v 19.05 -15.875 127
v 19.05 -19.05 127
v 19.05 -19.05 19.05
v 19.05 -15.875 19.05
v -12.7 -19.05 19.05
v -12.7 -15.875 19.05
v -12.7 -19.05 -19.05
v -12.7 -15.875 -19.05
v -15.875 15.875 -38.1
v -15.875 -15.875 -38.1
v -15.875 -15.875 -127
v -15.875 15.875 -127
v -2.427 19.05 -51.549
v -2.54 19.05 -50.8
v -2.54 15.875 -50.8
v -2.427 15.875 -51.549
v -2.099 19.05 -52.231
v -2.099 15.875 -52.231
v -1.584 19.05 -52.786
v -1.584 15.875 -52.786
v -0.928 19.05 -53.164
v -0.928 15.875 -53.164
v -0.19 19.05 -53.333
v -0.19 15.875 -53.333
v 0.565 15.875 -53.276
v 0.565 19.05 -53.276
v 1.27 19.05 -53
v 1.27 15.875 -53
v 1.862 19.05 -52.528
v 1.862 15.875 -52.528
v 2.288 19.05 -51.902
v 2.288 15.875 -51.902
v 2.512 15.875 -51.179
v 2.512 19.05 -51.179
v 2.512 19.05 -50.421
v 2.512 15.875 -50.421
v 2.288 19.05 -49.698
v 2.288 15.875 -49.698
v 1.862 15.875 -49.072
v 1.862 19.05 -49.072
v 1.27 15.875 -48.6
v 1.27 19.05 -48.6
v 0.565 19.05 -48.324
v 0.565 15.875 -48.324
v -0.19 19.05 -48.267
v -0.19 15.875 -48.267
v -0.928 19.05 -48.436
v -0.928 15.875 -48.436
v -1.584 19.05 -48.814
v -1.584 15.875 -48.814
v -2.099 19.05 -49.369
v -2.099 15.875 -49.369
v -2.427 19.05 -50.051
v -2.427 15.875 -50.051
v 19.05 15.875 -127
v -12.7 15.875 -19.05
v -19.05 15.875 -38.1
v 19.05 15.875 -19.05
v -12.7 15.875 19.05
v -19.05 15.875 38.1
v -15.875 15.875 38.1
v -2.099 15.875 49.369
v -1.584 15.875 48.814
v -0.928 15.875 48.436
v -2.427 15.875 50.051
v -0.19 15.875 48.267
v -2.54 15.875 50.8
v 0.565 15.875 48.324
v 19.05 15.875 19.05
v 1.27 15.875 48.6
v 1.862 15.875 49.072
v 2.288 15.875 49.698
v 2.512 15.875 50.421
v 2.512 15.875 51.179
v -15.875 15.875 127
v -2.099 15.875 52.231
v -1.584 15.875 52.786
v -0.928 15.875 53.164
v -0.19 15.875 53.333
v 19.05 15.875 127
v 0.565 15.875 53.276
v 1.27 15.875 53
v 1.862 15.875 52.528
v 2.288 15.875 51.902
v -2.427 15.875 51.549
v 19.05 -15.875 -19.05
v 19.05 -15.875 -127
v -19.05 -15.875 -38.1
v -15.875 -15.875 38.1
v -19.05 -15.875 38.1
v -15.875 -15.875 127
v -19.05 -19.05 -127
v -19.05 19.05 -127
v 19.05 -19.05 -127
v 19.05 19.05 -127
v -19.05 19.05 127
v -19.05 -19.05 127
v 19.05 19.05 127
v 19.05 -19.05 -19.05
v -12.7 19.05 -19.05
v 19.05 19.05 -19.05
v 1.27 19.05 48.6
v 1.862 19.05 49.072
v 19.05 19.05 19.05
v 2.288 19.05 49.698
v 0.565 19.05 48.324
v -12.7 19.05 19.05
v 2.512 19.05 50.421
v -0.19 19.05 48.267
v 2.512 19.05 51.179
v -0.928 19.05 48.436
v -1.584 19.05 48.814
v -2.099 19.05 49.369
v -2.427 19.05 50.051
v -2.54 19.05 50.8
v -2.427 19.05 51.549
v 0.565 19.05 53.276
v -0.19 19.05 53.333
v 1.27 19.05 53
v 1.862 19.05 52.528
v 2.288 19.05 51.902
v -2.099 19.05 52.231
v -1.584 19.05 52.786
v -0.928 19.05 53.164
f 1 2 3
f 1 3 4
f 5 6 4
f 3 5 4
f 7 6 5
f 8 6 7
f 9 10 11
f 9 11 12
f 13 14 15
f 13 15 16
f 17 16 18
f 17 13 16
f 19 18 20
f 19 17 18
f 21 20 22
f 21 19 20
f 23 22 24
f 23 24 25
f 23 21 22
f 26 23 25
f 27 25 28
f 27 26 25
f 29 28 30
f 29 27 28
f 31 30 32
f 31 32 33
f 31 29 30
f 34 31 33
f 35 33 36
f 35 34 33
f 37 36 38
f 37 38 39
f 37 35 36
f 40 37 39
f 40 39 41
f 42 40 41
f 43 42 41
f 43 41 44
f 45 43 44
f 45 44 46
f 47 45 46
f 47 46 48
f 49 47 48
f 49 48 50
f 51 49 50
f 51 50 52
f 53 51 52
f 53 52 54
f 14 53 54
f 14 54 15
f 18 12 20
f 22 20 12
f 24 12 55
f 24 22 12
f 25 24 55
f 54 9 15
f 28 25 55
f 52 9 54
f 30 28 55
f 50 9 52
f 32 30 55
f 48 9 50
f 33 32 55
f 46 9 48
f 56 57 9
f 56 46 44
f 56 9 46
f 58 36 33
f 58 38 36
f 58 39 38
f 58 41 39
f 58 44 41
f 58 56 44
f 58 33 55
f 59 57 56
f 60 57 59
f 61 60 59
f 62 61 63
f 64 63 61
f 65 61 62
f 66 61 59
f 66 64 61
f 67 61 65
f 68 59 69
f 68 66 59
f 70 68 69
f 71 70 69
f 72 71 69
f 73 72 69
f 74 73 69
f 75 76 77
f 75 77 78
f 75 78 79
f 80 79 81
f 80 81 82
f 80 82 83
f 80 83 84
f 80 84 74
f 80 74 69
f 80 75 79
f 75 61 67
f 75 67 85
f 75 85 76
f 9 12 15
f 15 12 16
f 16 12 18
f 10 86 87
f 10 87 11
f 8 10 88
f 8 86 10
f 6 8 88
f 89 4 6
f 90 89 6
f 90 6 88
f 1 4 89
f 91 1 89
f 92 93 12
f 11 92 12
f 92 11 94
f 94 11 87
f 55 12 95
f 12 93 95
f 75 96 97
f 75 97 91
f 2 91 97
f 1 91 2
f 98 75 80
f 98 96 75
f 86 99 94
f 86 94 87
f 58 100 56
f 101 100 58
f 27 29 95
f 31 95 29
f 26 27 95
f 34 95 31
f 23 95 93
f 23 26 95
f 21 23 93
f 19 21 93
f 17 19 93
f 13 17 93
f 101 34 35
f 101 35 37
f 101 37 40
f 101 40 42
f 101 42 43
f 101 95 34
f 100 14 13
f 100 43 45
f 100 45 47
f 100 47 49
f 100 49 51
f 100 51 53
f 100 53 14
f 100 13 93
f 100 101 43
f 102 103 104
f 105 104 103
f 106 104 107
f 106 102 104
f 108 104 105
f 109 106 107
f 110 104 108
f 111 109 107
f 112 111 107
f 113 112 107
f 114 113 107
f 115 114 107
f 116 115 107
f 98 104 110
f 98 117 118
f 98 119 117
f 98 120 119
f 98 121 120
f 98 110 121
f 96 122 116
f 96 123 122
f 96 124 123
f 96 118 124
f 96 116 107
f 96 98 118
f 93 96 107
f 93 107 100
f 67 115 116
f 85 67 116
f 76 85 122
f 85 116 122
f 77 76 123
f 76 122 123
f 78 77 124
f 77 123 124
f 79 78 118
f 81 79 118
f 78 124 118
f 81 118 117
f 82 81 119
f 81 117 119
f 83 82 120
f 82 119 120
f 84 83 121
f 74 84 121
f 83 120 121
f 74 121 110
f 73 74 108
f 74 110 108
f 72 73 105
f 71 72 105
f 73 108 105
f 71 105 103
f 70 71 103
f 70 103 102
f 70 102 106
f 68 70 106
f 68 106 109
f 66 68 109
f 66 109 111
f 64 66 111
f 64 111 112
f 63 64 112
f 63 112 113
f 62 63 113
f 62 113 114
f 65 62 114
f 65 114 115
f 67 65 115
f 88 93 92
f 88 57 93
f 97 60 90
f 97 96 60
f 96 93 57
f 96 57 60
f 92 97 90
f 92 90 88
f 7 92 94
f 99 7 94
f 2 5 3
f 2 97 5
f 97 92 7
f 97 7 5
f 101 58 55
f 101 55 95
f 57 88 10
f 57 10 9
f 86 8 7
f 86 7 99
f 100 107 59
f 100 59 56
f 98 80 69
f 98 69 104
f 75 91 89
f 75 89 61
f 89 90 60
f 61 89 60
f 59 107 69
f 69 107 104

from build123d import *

# Parameters (mm, degrees)
BOSS_EXTRUDE1_DEPTH = 127
SKETCH2_W           = 31.75
SKETCH2_H           = 38.1
CUT_EXTRUDE1_DEPTH  = 134.953396747
SKETCH3_W           = 76.2
SKETCH3_H           = 31.75
CUT_EXTRUDE2_DEPTH  = 134.953396747
CUT_EXTRUDE3_REACH  = 135.953
SKETCH4_R           = 2.54


with BuildPart() as part:
    # Sketch1 → Boss-Extrude1 (new, symmetric)
    with BuildSketch(Plane.XY):
        Polygon((19.05, 19.05), (-19.05, 19.05), (-19.05, -19.05), (19.05, -19.05), (19.05, -15.875), (-15.875, -15.875), (-15.875, 15.875), (19.05, 15.875), align=None)
    extrude(amount=BOSS_EXTRUDE1_DEPTH, both=True)

    # Sketch2 → Cut-Extrude1 (cut, through all)
    with BuildSketch(Plane(origin=(0, 19.05, 0), x_dir=(1, 0, 0), z_dir=(0, 1, 0))):
        with Locations((3.175, 0)):
            Rectangle(SKETCH2_W, SKETCH2_H)
    extrude(amount=-CUT_EXTRUDE1_DEPTH, mode=Mode.SUBTRACT)

    # Sketch3 → Cut-Extrude2 (cut, through all)
    with BuildSketch(Plane.ZY.offset(19.05)):
        Rectangle(SKETCH3_W, SKETCH3_H)
    extrude(amount=-CUT_EXTRUDE2_DEPTH, mode=Mode.SUBTRACT)

    # Sketch4 → Cut-Extrude3 (cut, up to next)
    with BuildSketch(Plane(origin=(0, 19.05, 0), x_dir=(1, 0, 0), z_dir=(0, 1, 0)), mode=Mode.PRIVATE) as cut_extrude3_sk1:
        with Locations(Location((0, -50.8, 0), (0, 0, 180))):
            Circle(SKETCH4_R)
    cut_extrude3_tool1 = extrude(cut_extrude3_sk1.sketch, amount=-CUT_EXTRUDE3_REACH, mode=Mode.PRIVATE) & part.part
    cut_extrude3 = cut_extrude3_tool1.solids().sort_by_distance((0, 19.05, 50.8))[0]
    add(cut_extrude3, mode=Mode.SUBTRACT)

    # Mirror1: Cut-Extrude3 across plane
    add(cut_extrude3.mirror(Plane.XY), mode=Mode.SUBTRACT)


solid = part.part
